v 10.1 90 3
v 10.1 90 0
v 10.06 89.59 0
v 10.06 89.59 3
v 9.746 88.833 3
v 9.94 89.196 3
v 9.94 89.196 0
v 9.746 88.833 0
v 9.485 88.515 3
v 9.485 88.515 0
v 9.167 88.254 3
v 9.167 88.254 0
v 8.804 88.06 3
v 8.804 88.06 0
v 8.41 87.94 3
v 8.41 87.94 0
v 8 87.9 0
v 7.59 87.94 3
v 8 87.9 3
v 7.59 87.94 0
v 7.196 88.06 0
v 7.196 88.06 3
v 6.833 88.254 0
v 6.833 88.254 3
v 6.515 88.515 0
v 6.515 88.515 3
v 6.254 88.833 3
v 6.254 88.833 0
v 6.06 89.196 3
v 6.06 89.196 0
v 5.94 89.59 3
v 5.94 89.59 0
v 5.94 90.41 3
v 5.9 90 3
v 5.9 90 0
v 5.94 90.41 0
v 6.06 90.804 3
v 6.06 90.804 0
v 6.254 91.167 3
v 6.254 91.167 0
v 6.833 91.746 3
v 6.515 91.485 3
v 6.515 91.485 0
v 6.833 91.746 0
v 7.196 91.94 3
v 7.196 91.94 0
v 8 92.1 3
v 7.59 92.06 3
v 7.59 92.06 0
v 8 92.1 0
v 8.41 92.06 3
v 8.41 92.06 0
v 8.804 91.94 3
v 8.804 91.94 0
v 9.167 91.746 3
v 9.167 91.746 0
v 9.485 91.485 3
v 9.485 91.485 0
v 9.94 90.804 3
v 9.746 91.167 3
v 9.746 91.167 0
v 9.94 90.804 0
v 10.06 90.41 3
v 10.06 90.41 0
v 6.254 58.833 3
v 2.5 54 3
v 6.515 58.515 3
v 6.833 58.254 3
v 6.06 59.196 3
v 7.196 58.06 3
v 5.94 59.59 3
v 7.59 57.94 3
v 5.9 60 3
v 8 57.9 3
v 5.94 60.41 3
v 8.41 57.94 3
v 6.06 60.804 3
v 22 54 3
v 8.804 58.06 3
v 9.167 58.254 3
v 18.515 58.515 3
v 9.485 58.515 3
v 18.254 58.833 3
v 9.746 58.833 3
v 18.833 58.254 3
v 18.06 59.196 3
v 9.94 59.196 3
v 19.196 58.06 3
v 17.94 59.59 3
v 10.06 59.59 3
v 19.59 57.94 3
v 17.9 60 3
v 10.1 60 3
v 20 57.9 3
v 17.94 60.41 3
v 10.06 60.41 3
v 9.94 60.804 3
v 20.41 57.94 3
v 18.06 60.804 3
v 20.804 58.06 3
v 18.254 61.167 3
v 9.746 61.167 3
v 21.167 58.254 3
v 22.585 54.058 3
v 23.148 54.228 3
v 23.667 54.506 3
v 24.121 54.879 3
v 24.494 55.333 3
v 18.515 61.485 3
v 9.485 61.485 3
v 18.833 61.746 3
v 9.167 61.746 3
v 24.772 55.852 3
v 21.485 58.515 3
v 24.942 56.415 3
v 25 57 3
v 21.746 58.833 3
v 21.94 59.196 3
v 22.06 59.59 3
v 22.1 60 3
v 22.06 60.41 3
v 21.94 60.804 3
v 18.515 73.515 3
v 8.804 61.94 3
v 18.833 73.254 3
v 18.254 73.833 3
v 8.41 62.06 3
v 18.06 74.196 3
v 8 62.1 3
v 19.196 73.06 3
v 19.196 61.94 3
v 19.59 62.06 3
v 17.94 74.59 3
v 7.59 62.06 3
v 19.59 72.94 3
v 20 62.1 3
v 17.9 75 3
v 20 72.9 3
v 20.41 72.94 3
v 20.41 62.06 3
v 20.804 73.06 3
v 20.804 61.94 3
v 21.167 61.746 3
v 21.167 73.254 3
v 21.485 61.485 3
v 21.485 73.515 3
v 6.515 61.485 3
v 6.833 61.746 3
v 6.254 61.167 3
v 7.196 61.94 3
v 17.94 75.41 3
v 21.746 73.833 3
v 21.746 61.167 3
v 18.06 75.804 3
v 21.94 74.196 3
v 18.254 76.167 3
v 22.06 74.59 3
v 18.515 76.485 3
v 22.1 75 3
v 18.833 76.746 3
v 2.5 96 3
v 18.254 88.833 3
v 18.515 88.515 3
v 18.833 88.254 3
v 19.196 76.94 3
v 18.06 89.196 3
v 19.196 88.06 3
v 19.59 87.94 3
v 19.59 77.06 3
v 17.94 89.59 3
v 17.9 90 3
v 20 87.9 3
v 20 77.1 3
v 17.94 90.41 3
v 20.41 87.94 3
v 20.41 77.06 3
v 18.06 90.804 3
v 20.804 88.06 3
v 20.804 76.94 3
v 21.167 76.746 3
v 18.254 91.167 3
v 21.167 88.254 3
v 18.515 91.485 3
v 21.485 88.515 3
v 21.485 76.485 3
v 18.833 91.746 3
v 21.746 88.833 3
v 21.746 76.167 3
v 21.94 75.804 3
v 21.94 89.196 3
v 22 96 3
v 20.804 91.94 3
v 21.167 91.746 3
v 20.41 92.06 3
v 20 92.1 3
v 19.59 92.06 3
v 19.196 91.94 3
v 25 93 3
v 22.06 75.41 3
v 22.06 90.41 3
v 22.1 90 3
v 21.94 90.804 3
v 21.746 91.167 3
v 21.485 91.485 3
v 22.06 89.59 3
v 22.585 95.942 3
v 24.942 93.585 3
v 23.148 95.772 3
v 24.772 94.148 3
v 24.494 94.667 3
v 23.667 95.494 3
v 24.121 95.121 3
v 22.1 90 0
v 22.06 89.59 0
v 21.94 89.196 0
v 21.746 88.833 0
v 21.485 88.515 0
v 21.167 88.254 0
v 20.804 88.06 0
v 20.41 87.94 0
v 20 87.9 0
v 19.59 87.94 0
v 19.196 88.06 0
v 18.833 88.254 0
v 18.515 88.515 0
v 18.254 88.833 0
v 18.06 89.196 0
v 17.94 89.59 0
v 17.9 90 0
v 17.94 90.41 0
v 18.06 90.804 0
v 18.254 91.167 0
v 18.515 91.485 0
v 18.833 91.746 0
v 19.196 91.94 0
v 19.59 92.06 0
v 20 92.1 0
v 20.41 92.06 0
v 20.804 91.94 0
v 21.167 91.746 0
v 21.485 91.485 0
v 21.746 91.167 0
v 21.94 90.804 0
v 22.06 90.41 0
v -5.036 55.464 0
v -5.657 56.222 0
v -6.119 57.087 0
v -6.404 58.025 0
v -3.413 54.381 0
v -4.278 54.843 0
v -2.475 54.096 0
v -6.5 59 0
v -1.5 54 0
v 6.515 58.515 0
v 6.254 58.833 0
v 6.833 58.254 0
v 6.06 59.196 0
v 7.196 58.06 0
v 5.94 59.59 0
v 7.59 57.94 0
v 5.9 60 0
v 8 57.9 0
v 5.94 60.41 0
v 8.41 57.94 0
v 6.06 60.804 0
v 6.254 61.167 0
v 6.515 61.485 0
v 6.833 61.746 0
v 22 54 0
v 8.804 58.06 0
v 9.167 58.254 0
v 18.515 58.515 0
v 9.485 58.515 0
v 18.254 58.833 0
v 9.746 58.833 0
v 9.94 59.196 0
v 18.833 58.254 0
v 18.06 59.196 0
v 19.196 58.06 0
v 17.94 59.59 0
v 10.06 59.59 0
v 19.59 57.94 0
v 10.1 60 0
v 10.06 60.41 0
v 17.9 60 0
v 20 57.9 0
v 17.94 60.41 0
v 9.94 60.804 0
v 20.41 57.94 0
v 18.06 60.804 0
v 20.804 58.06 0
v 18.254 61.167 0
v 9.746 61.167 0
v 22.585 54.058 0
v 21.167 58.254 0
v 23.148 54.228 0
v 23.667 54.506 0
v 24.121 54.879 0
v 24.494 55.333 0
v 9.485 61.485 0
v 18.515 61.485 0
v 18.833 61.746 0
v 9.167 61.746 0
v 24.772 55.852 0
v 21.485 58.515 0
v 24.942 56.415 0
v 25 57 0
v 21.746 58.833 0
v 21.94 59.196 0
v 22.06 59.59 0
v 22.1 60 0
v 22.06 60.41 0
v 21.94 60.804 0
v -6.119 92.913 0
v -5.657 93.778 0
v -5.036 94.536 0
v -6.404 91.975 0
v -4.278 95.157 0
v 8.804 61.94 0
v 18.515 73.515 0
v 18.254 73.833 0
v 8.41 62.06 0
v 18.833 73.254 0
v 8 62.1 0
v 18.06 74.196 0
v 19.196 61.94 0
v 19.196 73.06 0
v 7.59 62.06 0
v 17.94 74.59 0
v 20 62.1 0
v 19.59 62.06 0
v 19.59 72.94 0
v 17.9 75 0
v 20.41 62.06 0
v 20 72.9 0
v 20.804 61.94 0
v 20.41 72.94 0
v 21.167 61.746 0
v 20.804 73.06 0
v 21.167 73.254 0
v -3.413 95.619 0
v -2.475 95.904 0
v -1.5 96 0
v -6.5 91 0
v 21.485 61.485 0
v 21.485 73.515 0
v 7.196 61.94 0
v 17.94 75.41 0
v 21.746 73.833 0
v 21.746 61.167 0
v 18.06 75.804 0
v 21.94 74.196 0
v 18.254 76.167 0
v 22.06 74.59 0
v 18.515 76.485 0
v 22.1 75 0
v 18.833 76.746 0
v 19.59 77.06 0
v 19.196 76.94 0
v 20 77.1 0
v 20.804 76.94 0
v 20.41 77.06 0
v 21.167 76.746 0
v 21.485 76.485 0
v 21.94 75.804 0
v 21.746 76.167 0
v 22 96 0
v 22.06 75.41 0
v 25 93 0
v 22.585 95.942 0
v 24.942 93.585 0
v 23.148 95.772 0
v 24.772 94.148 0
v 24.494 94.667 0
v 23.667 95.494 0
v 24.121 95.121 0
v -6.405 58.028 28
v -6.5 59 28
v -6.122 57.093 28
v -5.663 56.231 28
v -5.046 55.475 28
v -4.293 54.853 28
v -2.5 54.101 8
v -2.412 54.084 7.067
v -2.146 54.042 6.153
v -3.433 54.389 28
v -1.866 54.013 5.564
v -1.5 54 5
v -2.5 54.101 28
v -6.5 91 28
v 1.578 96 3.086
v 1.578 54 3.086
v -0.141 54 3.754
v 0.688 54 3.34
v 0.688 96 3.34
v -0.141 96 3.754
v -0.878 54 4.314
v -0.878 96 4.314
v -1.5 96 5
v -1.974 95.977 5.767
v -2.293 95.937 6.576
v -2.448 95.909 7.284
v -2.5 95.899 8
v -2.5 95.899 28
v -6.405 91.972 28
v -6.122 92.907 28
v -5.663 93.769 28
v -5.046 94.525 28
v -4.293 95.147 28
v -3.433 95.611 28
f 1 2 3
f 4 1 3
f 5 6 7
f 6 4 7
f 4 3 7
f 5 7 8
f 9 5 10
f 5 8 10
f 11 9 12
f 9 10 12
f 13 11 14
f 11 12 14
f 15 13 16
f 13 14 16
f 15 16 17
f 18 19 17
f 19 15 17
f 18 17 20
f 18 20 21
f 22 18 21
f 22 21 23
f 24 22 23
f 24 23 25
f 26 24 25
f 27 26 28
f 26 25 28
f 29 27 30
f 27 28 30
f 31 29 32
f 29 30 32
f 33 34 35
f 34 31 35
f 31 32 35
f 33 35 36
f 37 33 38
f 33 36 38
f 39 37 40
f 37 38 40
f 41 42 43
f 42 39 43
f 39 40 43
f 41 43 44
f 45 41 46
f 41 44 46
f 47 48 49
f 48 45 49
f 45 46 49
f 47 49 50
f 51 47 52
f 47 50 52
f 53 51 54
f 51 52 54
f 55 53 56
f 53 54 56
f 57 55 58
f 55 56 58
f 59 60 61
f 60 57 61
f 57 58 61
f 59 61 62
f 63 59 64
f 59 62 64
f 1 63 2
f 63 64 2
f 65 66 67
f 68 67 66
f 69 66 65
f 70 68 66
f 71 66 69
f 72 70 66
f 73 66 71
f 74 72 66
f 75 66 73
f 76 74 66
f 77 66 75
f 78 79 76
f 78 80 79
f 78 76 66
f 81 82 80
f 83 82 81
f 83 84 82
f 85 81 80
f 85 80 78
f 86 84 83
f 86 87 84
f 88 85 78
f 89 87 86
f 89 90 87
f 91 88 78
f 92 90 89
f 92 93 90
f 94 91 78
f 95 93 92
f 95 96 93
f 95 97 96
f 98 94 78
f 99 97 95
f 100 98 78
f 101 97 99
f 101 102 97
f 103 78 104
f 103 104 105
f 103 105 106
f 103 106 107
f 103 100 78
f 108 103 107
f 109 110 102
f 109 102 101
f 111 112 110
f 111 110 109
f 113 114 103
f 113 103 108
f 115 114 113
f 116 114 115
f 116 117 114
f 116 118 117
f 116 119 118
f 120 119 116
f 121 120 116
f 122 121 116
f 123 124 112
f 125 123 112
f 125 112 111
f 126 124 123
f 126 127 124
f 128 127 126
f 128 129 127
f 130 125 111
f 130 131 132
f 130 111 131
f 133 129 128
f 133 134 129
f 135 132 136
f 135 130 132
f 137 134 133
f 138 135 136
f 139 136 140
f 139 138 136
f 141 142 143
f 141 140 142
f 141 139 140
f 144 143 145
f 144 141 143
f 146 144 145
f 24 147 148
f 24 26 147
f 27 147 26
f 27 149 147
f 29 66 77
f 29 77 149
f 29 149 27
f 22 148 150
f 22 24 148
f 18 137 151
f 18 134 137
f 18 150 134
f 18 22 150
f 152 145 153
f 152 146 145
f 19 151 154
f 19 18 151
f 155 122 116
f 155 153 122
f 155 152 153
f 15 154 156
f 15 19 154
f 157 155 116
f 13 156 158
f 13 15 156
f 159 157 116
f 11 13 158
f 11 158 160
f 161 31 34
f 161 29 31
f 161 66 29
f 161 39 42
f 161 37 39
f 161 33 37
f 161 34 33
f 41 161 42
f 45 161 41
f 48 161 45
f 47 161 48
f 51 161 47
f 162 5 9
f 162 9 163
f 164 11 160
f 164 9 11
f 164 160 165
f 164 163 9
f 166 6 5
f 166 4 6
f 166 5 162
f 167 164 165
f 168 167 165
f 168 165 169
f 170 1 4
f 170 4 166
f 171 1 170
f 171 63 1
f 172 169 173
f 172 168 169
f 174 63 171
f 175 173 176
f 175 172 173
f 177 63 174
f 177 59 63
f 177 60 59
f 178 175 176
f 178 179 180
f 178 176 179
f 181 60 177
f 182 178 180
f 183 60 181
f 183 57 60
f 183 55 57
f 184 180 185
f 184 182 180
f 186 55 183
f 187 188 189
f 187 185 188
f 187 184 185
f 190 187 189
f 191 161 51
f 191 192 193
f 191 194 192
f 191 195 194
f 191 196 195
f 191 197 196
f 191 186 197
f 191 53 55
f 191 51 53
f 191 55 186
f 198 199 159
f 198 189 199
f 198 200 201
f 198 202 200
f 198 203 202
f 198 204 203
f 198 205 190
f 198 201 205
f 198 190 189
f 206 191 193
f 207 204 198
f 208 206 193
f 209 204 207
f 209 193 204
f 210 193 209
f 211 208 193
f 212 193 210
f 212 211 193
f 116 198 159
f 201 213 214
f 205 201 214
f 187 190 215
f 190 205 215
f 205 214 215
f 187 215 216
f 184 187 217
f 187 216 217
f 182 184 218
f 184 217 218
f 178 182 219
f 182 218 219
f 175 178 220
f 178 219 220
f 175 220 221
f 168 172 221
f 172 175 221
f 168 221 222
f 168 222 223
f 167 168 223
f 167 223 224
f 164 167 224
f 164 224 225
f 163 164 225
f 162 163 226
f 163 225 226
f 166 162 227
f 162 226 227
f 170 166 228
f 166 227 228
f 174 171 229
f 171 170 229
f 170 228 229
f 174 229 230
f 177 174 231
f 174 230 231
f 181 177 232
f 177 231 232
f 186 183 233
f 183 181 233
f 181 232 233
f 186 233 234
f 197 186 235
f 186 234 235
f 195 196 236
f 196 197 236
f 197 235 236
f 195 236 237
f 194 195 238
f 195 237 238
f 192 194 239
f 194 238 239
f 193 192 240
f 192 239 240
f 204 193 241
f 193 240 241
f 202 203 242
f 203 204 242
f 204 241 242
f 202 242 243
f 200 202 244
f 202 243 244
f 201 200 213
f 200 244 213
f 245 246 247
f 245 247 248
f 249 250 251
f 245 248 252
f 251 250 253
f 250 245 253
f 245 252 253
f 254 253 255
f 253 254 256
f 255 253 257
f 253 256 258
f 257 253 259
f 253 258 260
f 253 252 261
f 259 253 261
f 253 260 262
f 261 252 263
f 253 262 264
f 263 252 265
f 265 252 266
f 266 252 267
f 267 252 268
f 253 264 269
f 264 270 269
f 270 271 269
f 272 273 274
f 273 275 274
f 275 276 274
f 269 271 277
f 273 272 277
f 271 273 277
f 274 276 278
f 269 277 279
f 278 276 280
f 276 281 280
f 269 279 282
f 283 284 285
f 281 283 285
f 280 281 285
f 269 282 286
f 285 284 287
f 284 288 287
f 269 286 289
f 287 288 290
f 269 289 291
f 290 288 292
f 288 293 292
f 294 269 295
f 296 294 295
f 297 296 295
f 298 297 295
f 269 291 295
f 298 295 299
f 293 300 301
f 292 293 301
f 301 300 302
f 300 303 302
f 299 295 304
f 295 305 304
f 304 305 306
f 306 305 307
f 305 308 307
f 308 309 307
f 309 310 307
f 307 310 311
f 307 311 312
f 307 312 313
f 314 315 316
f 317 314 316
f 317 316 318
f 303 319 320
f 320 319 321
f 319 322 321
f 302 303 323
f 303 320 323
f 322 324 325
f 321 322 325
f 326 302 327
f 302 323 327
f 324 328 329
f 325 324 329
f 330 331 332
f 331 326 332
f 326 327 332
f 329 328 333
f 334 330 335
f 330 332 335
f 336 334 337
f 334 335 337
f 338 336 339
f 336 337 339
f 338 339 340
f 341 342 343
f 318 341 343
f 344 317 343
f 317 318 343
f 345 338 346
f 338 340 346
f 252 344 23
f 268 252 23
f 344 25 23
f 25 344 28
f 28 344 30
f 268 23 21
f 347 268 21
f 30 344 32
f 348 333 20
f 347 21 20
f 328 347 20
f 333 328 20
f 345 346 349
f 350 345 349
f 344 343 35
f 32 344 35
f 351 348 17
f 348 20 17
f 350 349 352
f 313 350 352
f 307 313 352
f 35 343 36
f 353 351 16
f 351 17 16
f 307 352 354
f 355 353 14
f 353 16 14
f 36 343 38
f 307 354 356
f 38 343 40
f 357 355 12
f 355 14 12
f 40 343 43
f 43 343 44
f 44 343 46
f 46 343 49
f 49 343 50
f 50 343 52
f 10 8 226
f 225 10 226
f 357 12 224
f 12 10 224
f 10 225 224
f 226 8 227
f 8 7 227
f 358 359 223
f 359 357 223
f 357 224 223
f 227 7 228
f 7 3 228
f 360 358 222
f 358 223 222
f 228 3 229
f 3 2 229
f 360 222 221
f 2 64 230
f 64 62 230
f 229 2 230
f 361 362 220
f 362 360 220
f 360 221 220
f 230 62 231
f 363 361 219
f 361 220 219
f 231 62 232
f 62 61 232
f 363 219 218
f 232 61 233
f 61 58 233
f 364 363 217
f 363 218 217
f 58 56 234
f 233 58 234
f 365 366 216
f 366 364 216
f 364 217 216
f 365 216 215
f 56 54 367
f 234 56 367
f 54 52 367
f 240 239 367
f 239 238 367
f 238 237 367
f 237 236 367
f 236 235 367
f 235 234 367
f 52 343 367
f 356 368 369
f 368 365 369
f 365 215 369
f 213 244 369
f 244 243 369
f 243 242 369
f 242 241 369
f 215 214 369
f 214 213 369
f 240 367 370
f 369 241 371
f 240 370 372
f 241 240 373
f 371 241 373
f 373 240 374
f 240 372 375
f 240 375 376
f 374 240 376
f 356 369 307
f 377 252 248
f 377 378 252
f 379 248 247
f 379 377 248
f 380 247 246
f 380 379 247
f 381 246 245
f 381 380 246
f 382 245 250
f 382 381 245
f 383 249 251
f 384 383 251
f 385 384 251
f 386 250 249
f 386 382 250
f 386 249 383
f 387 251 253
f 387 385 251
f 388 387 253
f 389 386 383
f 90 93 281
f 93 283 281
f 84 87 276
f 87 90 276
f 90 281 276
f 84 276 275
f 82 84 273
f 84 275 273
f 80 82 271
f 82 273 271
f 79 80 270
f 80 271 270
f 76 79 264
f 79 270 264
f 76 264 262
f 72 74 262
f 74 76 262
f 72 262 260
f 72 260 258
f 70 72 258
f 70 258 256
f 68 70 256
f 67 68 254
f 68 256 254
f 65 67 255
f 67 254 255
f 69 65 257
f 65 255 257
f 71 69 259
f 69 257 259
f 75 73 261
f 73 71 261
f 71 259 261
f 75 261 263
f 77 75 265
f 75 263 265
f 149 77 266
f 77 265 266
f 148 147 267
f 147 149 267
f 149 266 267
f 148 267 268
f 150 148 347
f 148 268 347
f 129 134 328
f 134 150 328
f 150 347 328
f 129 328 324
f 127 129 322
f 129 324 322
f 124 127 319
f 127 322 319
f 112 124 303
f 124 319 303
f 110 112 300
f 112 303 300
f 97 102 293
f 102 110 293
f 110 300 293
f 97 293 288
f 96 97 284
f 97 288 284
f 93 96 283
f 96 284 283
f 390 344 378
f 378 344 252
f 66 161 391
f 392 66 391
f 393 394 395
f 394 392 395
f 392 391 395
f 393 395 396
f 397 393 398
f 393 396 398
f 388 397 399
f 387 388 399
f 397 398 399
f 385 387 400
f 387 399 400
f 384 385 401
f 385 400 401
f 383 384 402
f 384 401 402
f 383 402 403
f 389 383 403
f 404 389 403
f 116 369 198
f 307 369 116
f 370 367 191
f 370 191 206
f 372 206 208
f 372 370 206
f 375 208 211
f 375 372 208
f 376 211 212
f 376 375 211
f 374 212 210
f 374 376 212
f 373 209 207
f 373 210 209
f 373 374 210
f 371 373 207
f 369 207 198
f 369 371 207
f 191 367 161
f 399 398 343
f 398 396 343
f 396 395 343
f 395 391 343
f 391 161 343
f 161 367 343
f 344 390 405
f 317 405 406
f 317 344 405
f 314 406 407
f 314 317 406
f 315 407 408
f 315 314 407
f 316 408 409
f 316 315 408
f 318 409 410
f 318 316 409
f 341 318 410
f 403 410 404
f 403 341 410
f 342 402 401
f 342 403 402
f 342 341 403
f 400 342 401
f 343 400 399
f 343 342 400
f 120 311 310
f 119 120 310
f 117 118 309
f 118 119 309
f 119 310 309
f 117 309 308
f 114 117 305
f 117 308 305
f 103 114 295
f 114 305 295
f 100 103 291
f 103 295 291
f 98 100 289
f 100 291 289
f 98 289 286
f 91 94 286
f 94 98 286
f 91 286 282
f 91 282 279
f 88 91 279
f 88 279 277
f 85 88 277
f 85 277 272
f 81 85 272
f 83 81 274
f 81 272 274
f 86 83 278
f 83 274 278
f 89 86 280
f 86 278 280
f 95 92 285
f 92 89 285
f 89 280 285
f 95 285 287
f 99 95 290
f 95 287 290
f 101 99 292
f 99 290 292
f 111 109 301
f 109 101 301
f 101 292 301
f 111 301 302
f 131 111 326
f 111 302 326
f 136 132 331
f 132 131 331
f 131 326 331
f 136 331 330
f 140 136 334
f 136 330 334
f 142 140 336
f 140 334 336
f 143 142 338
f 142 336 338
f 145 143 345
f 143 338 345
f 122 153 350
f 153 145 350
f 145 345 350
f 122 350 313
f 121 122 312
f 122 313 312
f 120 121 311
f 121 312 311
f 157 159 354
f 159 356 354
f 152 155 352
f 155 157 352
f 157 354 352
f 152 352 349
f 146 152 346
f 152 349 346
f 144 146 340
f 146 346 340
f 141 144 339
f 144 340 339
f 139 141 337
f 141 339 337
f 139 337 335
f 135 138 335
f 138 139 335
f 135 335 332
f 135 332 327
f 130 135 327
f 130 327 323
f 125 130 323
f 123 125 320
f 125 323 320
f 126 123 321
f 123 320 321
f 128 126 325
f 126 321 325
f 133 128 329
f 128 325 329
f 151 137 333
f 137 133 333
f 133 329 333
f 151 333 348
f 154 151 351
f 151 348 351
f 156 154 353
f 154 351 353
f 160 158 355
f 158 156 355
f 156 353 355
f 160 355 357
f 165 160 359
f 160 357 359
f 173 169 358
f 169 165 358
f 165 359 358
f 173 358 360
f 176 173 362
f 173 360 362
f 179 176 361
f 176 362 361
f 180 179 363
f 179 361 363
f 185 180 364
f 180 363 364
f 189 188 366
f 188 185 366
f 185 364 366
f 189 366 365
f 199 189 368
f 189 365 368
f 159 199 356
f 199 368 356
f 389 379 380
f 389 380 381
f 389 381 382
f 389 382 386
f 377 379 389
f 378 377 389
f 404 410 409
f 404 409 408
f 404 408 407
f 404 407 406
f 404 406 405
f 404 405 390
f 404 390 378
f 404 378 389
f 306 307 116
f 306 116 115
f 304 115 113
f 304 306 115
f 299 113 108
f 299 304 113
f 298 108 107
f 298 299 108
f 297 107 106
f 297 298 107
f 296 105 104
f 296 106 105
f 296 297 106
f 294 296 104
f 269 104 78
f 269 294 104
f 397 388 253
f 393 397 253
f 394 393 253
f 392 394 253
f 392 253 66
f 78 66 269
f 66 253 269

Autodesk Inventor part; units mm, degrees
ref_plane "YZ Plane" through (0, 0, 0) normal (1, 0, 0) x (0, 1, 0)
ref_plane "XZ Plane" through (0, 0, 0) normal (0, 1, 0) x (-1, 0, 0)
ref_plane "XY Plane" through (0, 0, 0) normal (0, 0, 1) x (1, 0, 0)
sketch "草图2" plane through (0, 0, 0) normal (0, 0, 1) x (1, 0, 0)
  circle A0 centre (8, 60) radius 2.1 projected
  circle A1 centre (20, 60) radius 2.1 projected
  circle A2 centre (20, 75) radius 2.1 projected
  circle A3 centre (20, 90) radius 1.75 projected
  circle A4 centre (8, 90) radius 2.1 projected
  line L0 (22, 54) -> (0, 54) projected
  arc A5 (22, 54) -> (25, 57) centre (22, 57) ccw projected
  line L1 (25, 93) -> (25, 57) projected
  line L2 (0, 96) -> (22, 96) projected
  arc A6 (25, 93) -> (22, 96) centre (22, 93) ccw projected
  line L3 (0, 96) -> (-6.5, 96)
  line L4 (-6.5, 96) -> (-6.5, 54)
  line L5 (-6.5, 54) -> (0, 54)
  line L6 (0, 54) -> (0, 96)
  circle A7 centre (20, 60) radius 2.1
  circle A8 centre (8, 60) radius 2.1
  circle A9 centre (20, 75) radius 2.1
  circle A10 centre (20, 90) radius 2.1
  circle A11 centre (8, 90) radius 2.1
  point P0 (0, 0)
  dimension "d0" = 6.5
  dimension "d11" = 4.2
  dimension "d12" = 4.2
  dimension "d13" = 4.2
  dimension "d14" = 4.2
  dimension "d15" = 4.2
extrude "拉伸1" add sketch "草图2" along normal blind 3 contours L0 L6 L2 A6 L1 A5 | L5 L4 L3 L6
sketch "草图3" plane through (0, 0, 3) normal (0, 0, 1) x (1, 0, 0)
  line L0 (-6.5, 54) -> (22, 54) projected
  line L1 (22, 96) -> (-6.5, 96) projected
  line L2 (-6.5, 54) -> (-2.5, 54)
  line L3 (-2.5, 54) -> (-2.5, 96)
  line L4 (-2.5, 96) -> (-6.5, 96)
  line L5 (-6.5, 96) -> (-6.5, 54)
  point P0 (0, 0)
  dimension "d3" = 4
extrude "拉伸2" add sketch "草图3" along normal blind 25
fillet "圆角1" radius 5 1 edges at (-2.5, 75, 3)
fillet "圆角2" radius 5 2 edges at (-6.5, 96, 14) (-6.5, 54, 14)
properties part number "拖带架"
